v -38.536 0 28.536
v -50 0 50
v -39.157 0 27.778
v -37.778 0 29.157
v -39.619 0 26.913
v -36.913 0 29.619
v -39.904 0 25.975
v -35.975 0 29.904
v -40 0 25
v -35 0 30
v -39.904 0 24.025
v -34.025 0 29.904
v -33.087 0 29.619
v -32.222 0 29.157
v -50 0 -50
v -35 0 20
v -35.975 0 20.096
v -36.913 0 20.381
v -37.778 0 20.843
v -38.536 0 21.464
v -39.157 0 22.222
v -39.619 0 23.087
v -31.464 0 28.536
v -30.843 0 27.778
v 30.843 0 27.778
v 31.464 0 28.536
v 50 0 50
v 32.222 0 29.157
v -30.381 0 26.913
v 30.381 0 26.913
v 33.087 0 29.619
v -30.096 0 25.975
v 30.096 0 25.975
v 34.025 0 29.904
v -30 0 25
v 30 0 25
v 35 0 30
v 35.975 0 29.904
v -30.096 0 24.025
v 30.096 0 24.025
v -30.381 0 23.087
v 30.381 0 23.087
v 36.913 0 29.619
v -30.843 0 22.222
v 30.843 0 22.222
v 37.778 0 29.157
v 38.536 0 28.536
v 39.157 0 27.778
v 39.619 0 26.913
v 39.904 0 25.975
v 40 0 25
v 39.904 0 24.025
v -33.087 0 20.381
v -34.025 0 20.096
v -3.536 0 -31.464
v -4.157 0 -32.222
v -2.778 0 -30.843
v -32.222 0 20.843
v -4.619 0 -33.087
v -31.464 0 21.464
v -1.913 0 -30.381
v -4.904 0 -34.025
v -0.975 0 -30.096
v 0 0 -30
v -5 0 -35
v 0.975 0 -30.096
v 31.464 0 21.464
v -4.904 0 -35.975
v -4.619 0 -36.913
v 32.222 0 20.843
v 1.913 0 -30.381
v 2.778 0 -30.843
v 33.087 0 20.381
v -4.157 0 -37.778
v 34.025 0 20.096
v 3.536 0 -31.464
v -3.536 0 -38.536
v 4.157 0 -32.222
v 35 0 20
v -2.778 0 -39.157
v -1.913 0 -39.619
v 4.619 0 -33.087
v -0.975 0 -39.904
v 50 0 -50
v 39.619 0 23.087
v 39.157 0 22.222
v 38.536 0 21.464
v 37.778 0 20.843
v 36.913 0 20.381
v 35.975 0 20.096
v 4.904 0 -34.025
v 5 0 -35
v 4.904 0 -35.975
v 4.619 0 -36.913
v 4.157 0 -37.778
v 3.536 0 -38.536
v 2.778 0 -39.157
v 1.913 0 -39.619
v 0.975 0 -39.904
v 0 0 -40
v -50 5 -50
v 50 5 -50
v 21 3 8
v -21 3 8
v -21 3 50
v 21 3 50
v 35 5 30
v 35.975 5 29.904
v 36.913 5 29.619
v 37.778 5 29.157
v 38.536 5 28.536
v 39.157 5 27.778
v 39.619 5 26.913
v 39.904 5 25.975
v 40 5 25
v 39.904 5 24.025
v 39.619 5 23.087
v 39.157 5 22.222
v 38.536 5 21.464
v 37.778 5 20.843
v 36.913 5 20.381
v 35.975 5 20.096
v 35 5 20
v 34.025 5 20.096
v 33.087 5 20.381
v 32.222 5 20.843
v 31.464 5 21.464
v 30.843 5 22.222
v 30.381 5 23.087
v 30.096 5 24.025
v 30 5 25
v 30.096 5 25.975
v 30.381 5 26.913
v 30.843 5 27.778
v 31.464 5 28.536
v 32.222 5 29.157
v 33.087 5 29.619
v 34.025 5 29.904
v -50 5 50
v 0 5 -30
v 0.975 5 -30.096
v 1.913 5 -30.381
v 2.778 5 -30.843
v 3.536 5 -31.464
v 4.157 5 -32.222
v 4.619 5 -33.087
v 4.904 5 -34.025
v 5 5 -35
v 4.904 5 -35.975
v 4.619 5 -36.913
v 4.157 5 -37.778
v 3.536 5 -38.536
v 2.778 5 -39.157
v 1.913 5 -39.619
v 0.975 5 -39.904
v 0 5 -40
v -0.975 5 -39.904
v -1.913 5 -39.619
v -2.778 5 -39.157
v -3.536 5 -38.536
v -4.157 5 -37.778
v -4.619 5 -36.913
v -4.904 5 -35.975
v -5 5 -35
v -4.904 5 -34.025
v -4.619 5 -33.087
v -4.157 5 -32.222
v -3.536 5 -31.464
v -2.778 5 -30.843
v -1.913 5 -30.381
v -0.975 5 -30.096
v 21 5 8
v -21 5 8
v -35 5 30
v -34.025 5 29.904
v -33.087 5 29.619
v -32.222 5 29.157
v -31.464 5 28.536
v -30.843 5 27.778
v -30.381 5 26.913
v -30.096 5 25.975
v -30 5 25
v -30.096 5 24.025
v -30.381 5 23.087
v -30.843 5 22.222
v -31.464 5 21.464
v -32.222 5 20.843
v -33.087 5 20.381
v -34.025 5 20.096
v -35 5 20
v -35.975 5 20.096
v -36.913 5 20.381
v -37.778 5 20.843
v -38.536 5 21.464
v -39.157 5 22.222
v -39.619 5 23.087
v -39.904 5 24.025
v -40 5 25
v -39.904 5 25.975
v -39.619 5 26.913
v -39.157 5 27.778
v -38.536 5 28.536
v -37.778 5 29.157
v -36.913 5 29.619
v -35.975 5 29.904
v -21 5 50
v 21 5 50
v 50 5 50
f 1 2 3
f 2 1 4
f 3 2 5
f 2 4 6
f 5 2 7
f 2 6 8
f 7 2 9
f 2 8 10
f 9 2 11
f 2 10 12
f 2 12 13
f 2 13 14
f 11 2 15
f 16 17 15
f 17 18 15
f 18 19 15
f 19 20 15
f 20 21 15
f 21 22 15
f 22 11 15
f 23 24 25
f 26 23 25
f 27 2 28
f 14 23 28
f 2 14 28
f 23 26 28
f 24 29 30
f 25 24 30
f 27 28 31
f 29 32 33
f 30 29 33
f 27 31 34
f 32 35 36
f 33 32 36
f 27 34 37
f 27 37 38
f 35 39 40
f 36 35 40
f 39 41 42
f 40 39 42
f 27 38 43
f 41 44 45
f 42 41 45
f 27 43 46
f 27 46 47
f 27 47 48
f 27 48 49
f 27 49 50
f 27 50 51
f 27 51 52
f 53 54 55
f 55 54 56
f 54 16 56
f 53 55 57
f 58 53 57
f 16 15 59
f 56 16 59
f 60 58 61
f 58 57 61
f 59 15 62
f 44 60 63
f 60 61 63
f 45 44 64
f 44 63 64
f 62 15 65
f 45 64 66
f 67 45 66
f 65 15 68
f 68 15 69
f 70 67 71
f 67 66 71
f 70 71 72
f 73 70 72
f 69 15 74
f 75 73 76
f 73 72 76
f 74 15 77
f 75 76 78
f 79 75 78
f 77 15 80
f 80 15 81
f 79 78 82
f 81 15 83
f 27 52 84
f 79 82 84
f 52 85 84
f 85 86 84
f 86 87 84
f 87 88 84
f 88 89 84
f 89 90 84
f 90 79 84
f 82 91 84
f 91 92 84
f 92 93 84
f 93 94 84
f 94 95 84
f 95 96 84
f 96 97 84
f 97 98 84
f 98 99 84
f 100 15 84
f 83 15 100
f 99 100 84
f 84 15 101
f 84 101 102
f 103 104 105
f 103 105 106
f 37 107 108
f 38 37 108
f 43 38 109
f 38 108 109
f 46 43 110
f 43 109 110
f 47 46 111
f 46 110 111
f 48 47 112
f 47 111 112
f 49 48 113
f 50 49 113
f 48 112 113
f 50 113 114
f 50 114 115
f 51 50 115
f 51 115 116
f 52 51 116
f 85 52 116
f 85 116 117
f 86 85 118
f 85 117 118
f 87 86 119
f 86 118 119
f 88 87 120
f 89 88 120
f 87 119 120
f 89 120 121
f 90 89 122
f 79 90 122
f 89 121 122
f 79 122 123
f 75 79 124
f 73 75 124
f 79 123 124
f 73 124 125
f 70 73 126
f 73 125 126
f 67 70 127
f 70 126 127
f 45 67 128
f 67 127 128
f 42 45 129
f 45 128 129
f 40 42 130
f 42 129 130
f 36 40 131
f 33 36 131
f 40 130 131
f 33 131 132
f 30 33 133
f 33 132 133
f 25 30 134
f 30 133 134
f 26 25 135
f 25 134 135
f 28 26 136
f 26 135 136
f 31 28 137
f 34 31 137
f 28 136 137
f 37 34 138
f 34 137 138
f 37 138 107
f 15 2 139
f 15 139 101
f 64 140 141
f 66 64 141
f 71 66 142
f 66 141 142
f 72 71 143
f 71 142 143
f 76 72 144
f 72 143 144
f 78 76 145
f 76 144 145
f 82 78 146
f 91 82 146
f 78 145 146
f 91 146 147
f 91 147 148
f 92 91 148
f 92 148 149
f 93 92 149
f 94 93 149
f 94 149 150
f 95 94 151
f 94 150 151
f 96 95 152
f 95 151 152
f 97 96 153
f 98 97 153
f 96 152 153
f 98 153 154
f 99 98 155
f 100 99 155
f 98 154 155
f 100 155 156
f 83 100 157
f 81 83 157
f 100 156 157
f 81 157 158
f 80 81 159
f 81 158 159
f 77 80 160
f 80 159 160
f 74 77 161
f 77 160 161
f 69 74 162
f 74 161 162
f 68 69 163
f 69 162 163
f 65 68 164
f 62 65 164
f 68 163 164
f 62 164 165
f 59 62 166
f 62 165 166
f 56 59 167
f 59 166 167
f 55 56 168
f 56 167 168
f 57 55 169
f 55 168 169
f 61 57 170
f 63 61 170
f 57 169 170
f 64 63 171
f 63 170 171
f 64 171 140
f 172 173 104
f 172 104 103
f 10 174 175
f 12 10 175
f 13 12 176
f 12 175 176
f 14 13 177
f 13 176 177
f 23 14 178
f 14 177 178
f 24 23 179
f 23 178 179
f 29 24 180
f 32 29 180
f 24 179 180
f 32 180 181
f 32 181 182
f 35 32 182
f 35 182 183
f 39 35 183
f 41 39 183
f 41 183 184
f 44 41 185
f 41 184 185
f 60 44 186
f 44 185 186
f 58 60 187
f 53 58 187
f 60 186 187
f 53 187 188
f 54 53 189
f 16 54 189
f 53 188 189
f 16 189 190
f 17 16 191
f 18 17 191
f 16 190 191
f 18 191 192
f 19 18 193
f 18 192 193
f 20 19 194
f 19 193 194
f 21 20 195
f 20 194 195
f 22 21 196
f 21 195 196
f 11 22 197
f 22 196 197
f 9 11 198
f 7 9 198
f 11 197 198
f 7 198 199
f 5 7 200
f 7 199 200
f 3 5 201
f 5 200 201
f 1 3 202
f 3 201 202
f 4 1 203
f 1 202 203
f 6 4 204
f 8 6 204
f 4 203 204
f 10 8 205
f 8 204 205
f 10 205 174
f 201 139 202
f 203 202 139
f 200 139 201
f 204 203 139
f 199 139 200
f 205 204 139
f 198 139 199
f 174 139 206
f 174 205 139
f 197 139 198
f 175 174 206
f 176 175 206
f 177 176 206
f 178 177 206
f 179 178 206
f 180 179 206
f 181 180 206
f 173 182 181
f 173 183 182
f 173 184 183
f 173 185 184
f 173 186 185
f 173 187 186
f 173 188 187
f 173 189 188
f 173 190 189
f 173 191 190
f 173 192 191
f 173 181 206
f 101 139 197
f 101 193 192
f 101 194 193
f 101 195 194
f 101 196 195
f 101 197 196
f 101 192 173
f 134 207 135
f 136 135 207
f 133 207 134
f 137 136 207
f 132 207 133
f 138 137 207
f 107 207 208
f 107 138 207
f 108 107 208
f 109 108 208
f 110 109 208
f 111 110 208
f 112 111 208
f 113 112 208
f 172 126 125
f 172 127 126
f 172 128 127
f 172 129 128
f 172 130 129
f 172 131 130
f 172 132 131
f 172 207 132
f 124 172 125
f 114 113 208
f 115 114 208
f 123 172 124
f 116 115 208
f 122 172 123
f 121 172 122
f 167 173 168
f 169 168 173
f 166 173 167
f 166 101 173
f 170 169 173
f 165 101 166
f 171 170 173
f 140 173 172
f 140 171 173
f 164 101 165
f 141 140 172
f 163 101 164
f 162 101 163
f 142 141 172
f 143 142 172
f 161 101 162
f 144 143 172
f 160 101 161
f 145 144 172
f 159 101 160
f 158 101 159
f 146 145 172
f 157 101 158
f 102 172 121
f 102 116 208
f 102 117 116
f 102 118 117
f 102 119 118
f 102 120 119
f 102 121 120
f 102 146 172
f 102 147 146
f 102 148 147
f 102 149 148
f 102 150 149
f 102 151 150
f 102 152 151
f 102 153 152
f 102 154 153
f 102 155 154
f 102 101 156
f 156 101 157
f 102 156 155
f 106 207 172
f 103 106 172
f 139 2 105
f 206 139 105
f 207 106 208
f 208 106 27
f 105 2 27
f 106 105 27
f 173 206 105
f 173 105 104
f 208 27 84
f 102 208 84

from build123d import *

# Parameters (mm, degrees)
SKETCH1_W           = 100
SKETCH1_H           = 100
BOSS_EXTRUDE1_DEPTH = 5
SKETCH2_W           = 42
SKETCH2_H           = 42
CUT_EXTRUDE1_DEPTH  = 2
SKETCH3_R           = 5
CUT_EXTRUDE2_DEPTH  = 5


with BuildPart() as part:
    # Sketch1 → Boss-Extrude1 (new body)
    with BuildSketch(Plane(origin=(0, 0, 0), x_dir=(1, 0, 0), z_dir=(0, 1, 0))):
        Rectangle(SKETCH1_W, SKETCH1_H)
    extrude(amount=BOSS_EXTRUDE1_DEPTH)

    # Sketch2 → Cut-Extrude1 (cut)
    with BuildSketch(Plane(origin=(0, 5, 0), x_dir=(1, 0, 0), z_dir=(0, 1, 0))):
        with Locations((0, -29)):
            Rectangle(SKETCH2_W, SKETCH2_H)
    extrude(amount=-CUT_EXTRUDE1_DEPTH, mode=Mode.SUBTRACT)

    # Sketch3 → Cut-Extrude2 (cut)
    with BuildSketch(Plane(origin=(0, 5, 0), x_dir=(1, 0, 0), z_dir=(0, 1, 0))):
        with Locations(Location((-35, -25, 0), (0, 0, 270))):
            Circle(SKETCH3_R)
        with Locations(Location((35, -25, 0), (0, 0, 270))):
            Circle(SKETCH3_R)
        with Locations(Location((0, 35, 0), (0, 0, 270))):
            Circle(SKETCH3_R)
    extrude(amount=-CUT_EXTRUDE2_DEPTH, mode=Mode.SUBTRACT)


solid = part.part
